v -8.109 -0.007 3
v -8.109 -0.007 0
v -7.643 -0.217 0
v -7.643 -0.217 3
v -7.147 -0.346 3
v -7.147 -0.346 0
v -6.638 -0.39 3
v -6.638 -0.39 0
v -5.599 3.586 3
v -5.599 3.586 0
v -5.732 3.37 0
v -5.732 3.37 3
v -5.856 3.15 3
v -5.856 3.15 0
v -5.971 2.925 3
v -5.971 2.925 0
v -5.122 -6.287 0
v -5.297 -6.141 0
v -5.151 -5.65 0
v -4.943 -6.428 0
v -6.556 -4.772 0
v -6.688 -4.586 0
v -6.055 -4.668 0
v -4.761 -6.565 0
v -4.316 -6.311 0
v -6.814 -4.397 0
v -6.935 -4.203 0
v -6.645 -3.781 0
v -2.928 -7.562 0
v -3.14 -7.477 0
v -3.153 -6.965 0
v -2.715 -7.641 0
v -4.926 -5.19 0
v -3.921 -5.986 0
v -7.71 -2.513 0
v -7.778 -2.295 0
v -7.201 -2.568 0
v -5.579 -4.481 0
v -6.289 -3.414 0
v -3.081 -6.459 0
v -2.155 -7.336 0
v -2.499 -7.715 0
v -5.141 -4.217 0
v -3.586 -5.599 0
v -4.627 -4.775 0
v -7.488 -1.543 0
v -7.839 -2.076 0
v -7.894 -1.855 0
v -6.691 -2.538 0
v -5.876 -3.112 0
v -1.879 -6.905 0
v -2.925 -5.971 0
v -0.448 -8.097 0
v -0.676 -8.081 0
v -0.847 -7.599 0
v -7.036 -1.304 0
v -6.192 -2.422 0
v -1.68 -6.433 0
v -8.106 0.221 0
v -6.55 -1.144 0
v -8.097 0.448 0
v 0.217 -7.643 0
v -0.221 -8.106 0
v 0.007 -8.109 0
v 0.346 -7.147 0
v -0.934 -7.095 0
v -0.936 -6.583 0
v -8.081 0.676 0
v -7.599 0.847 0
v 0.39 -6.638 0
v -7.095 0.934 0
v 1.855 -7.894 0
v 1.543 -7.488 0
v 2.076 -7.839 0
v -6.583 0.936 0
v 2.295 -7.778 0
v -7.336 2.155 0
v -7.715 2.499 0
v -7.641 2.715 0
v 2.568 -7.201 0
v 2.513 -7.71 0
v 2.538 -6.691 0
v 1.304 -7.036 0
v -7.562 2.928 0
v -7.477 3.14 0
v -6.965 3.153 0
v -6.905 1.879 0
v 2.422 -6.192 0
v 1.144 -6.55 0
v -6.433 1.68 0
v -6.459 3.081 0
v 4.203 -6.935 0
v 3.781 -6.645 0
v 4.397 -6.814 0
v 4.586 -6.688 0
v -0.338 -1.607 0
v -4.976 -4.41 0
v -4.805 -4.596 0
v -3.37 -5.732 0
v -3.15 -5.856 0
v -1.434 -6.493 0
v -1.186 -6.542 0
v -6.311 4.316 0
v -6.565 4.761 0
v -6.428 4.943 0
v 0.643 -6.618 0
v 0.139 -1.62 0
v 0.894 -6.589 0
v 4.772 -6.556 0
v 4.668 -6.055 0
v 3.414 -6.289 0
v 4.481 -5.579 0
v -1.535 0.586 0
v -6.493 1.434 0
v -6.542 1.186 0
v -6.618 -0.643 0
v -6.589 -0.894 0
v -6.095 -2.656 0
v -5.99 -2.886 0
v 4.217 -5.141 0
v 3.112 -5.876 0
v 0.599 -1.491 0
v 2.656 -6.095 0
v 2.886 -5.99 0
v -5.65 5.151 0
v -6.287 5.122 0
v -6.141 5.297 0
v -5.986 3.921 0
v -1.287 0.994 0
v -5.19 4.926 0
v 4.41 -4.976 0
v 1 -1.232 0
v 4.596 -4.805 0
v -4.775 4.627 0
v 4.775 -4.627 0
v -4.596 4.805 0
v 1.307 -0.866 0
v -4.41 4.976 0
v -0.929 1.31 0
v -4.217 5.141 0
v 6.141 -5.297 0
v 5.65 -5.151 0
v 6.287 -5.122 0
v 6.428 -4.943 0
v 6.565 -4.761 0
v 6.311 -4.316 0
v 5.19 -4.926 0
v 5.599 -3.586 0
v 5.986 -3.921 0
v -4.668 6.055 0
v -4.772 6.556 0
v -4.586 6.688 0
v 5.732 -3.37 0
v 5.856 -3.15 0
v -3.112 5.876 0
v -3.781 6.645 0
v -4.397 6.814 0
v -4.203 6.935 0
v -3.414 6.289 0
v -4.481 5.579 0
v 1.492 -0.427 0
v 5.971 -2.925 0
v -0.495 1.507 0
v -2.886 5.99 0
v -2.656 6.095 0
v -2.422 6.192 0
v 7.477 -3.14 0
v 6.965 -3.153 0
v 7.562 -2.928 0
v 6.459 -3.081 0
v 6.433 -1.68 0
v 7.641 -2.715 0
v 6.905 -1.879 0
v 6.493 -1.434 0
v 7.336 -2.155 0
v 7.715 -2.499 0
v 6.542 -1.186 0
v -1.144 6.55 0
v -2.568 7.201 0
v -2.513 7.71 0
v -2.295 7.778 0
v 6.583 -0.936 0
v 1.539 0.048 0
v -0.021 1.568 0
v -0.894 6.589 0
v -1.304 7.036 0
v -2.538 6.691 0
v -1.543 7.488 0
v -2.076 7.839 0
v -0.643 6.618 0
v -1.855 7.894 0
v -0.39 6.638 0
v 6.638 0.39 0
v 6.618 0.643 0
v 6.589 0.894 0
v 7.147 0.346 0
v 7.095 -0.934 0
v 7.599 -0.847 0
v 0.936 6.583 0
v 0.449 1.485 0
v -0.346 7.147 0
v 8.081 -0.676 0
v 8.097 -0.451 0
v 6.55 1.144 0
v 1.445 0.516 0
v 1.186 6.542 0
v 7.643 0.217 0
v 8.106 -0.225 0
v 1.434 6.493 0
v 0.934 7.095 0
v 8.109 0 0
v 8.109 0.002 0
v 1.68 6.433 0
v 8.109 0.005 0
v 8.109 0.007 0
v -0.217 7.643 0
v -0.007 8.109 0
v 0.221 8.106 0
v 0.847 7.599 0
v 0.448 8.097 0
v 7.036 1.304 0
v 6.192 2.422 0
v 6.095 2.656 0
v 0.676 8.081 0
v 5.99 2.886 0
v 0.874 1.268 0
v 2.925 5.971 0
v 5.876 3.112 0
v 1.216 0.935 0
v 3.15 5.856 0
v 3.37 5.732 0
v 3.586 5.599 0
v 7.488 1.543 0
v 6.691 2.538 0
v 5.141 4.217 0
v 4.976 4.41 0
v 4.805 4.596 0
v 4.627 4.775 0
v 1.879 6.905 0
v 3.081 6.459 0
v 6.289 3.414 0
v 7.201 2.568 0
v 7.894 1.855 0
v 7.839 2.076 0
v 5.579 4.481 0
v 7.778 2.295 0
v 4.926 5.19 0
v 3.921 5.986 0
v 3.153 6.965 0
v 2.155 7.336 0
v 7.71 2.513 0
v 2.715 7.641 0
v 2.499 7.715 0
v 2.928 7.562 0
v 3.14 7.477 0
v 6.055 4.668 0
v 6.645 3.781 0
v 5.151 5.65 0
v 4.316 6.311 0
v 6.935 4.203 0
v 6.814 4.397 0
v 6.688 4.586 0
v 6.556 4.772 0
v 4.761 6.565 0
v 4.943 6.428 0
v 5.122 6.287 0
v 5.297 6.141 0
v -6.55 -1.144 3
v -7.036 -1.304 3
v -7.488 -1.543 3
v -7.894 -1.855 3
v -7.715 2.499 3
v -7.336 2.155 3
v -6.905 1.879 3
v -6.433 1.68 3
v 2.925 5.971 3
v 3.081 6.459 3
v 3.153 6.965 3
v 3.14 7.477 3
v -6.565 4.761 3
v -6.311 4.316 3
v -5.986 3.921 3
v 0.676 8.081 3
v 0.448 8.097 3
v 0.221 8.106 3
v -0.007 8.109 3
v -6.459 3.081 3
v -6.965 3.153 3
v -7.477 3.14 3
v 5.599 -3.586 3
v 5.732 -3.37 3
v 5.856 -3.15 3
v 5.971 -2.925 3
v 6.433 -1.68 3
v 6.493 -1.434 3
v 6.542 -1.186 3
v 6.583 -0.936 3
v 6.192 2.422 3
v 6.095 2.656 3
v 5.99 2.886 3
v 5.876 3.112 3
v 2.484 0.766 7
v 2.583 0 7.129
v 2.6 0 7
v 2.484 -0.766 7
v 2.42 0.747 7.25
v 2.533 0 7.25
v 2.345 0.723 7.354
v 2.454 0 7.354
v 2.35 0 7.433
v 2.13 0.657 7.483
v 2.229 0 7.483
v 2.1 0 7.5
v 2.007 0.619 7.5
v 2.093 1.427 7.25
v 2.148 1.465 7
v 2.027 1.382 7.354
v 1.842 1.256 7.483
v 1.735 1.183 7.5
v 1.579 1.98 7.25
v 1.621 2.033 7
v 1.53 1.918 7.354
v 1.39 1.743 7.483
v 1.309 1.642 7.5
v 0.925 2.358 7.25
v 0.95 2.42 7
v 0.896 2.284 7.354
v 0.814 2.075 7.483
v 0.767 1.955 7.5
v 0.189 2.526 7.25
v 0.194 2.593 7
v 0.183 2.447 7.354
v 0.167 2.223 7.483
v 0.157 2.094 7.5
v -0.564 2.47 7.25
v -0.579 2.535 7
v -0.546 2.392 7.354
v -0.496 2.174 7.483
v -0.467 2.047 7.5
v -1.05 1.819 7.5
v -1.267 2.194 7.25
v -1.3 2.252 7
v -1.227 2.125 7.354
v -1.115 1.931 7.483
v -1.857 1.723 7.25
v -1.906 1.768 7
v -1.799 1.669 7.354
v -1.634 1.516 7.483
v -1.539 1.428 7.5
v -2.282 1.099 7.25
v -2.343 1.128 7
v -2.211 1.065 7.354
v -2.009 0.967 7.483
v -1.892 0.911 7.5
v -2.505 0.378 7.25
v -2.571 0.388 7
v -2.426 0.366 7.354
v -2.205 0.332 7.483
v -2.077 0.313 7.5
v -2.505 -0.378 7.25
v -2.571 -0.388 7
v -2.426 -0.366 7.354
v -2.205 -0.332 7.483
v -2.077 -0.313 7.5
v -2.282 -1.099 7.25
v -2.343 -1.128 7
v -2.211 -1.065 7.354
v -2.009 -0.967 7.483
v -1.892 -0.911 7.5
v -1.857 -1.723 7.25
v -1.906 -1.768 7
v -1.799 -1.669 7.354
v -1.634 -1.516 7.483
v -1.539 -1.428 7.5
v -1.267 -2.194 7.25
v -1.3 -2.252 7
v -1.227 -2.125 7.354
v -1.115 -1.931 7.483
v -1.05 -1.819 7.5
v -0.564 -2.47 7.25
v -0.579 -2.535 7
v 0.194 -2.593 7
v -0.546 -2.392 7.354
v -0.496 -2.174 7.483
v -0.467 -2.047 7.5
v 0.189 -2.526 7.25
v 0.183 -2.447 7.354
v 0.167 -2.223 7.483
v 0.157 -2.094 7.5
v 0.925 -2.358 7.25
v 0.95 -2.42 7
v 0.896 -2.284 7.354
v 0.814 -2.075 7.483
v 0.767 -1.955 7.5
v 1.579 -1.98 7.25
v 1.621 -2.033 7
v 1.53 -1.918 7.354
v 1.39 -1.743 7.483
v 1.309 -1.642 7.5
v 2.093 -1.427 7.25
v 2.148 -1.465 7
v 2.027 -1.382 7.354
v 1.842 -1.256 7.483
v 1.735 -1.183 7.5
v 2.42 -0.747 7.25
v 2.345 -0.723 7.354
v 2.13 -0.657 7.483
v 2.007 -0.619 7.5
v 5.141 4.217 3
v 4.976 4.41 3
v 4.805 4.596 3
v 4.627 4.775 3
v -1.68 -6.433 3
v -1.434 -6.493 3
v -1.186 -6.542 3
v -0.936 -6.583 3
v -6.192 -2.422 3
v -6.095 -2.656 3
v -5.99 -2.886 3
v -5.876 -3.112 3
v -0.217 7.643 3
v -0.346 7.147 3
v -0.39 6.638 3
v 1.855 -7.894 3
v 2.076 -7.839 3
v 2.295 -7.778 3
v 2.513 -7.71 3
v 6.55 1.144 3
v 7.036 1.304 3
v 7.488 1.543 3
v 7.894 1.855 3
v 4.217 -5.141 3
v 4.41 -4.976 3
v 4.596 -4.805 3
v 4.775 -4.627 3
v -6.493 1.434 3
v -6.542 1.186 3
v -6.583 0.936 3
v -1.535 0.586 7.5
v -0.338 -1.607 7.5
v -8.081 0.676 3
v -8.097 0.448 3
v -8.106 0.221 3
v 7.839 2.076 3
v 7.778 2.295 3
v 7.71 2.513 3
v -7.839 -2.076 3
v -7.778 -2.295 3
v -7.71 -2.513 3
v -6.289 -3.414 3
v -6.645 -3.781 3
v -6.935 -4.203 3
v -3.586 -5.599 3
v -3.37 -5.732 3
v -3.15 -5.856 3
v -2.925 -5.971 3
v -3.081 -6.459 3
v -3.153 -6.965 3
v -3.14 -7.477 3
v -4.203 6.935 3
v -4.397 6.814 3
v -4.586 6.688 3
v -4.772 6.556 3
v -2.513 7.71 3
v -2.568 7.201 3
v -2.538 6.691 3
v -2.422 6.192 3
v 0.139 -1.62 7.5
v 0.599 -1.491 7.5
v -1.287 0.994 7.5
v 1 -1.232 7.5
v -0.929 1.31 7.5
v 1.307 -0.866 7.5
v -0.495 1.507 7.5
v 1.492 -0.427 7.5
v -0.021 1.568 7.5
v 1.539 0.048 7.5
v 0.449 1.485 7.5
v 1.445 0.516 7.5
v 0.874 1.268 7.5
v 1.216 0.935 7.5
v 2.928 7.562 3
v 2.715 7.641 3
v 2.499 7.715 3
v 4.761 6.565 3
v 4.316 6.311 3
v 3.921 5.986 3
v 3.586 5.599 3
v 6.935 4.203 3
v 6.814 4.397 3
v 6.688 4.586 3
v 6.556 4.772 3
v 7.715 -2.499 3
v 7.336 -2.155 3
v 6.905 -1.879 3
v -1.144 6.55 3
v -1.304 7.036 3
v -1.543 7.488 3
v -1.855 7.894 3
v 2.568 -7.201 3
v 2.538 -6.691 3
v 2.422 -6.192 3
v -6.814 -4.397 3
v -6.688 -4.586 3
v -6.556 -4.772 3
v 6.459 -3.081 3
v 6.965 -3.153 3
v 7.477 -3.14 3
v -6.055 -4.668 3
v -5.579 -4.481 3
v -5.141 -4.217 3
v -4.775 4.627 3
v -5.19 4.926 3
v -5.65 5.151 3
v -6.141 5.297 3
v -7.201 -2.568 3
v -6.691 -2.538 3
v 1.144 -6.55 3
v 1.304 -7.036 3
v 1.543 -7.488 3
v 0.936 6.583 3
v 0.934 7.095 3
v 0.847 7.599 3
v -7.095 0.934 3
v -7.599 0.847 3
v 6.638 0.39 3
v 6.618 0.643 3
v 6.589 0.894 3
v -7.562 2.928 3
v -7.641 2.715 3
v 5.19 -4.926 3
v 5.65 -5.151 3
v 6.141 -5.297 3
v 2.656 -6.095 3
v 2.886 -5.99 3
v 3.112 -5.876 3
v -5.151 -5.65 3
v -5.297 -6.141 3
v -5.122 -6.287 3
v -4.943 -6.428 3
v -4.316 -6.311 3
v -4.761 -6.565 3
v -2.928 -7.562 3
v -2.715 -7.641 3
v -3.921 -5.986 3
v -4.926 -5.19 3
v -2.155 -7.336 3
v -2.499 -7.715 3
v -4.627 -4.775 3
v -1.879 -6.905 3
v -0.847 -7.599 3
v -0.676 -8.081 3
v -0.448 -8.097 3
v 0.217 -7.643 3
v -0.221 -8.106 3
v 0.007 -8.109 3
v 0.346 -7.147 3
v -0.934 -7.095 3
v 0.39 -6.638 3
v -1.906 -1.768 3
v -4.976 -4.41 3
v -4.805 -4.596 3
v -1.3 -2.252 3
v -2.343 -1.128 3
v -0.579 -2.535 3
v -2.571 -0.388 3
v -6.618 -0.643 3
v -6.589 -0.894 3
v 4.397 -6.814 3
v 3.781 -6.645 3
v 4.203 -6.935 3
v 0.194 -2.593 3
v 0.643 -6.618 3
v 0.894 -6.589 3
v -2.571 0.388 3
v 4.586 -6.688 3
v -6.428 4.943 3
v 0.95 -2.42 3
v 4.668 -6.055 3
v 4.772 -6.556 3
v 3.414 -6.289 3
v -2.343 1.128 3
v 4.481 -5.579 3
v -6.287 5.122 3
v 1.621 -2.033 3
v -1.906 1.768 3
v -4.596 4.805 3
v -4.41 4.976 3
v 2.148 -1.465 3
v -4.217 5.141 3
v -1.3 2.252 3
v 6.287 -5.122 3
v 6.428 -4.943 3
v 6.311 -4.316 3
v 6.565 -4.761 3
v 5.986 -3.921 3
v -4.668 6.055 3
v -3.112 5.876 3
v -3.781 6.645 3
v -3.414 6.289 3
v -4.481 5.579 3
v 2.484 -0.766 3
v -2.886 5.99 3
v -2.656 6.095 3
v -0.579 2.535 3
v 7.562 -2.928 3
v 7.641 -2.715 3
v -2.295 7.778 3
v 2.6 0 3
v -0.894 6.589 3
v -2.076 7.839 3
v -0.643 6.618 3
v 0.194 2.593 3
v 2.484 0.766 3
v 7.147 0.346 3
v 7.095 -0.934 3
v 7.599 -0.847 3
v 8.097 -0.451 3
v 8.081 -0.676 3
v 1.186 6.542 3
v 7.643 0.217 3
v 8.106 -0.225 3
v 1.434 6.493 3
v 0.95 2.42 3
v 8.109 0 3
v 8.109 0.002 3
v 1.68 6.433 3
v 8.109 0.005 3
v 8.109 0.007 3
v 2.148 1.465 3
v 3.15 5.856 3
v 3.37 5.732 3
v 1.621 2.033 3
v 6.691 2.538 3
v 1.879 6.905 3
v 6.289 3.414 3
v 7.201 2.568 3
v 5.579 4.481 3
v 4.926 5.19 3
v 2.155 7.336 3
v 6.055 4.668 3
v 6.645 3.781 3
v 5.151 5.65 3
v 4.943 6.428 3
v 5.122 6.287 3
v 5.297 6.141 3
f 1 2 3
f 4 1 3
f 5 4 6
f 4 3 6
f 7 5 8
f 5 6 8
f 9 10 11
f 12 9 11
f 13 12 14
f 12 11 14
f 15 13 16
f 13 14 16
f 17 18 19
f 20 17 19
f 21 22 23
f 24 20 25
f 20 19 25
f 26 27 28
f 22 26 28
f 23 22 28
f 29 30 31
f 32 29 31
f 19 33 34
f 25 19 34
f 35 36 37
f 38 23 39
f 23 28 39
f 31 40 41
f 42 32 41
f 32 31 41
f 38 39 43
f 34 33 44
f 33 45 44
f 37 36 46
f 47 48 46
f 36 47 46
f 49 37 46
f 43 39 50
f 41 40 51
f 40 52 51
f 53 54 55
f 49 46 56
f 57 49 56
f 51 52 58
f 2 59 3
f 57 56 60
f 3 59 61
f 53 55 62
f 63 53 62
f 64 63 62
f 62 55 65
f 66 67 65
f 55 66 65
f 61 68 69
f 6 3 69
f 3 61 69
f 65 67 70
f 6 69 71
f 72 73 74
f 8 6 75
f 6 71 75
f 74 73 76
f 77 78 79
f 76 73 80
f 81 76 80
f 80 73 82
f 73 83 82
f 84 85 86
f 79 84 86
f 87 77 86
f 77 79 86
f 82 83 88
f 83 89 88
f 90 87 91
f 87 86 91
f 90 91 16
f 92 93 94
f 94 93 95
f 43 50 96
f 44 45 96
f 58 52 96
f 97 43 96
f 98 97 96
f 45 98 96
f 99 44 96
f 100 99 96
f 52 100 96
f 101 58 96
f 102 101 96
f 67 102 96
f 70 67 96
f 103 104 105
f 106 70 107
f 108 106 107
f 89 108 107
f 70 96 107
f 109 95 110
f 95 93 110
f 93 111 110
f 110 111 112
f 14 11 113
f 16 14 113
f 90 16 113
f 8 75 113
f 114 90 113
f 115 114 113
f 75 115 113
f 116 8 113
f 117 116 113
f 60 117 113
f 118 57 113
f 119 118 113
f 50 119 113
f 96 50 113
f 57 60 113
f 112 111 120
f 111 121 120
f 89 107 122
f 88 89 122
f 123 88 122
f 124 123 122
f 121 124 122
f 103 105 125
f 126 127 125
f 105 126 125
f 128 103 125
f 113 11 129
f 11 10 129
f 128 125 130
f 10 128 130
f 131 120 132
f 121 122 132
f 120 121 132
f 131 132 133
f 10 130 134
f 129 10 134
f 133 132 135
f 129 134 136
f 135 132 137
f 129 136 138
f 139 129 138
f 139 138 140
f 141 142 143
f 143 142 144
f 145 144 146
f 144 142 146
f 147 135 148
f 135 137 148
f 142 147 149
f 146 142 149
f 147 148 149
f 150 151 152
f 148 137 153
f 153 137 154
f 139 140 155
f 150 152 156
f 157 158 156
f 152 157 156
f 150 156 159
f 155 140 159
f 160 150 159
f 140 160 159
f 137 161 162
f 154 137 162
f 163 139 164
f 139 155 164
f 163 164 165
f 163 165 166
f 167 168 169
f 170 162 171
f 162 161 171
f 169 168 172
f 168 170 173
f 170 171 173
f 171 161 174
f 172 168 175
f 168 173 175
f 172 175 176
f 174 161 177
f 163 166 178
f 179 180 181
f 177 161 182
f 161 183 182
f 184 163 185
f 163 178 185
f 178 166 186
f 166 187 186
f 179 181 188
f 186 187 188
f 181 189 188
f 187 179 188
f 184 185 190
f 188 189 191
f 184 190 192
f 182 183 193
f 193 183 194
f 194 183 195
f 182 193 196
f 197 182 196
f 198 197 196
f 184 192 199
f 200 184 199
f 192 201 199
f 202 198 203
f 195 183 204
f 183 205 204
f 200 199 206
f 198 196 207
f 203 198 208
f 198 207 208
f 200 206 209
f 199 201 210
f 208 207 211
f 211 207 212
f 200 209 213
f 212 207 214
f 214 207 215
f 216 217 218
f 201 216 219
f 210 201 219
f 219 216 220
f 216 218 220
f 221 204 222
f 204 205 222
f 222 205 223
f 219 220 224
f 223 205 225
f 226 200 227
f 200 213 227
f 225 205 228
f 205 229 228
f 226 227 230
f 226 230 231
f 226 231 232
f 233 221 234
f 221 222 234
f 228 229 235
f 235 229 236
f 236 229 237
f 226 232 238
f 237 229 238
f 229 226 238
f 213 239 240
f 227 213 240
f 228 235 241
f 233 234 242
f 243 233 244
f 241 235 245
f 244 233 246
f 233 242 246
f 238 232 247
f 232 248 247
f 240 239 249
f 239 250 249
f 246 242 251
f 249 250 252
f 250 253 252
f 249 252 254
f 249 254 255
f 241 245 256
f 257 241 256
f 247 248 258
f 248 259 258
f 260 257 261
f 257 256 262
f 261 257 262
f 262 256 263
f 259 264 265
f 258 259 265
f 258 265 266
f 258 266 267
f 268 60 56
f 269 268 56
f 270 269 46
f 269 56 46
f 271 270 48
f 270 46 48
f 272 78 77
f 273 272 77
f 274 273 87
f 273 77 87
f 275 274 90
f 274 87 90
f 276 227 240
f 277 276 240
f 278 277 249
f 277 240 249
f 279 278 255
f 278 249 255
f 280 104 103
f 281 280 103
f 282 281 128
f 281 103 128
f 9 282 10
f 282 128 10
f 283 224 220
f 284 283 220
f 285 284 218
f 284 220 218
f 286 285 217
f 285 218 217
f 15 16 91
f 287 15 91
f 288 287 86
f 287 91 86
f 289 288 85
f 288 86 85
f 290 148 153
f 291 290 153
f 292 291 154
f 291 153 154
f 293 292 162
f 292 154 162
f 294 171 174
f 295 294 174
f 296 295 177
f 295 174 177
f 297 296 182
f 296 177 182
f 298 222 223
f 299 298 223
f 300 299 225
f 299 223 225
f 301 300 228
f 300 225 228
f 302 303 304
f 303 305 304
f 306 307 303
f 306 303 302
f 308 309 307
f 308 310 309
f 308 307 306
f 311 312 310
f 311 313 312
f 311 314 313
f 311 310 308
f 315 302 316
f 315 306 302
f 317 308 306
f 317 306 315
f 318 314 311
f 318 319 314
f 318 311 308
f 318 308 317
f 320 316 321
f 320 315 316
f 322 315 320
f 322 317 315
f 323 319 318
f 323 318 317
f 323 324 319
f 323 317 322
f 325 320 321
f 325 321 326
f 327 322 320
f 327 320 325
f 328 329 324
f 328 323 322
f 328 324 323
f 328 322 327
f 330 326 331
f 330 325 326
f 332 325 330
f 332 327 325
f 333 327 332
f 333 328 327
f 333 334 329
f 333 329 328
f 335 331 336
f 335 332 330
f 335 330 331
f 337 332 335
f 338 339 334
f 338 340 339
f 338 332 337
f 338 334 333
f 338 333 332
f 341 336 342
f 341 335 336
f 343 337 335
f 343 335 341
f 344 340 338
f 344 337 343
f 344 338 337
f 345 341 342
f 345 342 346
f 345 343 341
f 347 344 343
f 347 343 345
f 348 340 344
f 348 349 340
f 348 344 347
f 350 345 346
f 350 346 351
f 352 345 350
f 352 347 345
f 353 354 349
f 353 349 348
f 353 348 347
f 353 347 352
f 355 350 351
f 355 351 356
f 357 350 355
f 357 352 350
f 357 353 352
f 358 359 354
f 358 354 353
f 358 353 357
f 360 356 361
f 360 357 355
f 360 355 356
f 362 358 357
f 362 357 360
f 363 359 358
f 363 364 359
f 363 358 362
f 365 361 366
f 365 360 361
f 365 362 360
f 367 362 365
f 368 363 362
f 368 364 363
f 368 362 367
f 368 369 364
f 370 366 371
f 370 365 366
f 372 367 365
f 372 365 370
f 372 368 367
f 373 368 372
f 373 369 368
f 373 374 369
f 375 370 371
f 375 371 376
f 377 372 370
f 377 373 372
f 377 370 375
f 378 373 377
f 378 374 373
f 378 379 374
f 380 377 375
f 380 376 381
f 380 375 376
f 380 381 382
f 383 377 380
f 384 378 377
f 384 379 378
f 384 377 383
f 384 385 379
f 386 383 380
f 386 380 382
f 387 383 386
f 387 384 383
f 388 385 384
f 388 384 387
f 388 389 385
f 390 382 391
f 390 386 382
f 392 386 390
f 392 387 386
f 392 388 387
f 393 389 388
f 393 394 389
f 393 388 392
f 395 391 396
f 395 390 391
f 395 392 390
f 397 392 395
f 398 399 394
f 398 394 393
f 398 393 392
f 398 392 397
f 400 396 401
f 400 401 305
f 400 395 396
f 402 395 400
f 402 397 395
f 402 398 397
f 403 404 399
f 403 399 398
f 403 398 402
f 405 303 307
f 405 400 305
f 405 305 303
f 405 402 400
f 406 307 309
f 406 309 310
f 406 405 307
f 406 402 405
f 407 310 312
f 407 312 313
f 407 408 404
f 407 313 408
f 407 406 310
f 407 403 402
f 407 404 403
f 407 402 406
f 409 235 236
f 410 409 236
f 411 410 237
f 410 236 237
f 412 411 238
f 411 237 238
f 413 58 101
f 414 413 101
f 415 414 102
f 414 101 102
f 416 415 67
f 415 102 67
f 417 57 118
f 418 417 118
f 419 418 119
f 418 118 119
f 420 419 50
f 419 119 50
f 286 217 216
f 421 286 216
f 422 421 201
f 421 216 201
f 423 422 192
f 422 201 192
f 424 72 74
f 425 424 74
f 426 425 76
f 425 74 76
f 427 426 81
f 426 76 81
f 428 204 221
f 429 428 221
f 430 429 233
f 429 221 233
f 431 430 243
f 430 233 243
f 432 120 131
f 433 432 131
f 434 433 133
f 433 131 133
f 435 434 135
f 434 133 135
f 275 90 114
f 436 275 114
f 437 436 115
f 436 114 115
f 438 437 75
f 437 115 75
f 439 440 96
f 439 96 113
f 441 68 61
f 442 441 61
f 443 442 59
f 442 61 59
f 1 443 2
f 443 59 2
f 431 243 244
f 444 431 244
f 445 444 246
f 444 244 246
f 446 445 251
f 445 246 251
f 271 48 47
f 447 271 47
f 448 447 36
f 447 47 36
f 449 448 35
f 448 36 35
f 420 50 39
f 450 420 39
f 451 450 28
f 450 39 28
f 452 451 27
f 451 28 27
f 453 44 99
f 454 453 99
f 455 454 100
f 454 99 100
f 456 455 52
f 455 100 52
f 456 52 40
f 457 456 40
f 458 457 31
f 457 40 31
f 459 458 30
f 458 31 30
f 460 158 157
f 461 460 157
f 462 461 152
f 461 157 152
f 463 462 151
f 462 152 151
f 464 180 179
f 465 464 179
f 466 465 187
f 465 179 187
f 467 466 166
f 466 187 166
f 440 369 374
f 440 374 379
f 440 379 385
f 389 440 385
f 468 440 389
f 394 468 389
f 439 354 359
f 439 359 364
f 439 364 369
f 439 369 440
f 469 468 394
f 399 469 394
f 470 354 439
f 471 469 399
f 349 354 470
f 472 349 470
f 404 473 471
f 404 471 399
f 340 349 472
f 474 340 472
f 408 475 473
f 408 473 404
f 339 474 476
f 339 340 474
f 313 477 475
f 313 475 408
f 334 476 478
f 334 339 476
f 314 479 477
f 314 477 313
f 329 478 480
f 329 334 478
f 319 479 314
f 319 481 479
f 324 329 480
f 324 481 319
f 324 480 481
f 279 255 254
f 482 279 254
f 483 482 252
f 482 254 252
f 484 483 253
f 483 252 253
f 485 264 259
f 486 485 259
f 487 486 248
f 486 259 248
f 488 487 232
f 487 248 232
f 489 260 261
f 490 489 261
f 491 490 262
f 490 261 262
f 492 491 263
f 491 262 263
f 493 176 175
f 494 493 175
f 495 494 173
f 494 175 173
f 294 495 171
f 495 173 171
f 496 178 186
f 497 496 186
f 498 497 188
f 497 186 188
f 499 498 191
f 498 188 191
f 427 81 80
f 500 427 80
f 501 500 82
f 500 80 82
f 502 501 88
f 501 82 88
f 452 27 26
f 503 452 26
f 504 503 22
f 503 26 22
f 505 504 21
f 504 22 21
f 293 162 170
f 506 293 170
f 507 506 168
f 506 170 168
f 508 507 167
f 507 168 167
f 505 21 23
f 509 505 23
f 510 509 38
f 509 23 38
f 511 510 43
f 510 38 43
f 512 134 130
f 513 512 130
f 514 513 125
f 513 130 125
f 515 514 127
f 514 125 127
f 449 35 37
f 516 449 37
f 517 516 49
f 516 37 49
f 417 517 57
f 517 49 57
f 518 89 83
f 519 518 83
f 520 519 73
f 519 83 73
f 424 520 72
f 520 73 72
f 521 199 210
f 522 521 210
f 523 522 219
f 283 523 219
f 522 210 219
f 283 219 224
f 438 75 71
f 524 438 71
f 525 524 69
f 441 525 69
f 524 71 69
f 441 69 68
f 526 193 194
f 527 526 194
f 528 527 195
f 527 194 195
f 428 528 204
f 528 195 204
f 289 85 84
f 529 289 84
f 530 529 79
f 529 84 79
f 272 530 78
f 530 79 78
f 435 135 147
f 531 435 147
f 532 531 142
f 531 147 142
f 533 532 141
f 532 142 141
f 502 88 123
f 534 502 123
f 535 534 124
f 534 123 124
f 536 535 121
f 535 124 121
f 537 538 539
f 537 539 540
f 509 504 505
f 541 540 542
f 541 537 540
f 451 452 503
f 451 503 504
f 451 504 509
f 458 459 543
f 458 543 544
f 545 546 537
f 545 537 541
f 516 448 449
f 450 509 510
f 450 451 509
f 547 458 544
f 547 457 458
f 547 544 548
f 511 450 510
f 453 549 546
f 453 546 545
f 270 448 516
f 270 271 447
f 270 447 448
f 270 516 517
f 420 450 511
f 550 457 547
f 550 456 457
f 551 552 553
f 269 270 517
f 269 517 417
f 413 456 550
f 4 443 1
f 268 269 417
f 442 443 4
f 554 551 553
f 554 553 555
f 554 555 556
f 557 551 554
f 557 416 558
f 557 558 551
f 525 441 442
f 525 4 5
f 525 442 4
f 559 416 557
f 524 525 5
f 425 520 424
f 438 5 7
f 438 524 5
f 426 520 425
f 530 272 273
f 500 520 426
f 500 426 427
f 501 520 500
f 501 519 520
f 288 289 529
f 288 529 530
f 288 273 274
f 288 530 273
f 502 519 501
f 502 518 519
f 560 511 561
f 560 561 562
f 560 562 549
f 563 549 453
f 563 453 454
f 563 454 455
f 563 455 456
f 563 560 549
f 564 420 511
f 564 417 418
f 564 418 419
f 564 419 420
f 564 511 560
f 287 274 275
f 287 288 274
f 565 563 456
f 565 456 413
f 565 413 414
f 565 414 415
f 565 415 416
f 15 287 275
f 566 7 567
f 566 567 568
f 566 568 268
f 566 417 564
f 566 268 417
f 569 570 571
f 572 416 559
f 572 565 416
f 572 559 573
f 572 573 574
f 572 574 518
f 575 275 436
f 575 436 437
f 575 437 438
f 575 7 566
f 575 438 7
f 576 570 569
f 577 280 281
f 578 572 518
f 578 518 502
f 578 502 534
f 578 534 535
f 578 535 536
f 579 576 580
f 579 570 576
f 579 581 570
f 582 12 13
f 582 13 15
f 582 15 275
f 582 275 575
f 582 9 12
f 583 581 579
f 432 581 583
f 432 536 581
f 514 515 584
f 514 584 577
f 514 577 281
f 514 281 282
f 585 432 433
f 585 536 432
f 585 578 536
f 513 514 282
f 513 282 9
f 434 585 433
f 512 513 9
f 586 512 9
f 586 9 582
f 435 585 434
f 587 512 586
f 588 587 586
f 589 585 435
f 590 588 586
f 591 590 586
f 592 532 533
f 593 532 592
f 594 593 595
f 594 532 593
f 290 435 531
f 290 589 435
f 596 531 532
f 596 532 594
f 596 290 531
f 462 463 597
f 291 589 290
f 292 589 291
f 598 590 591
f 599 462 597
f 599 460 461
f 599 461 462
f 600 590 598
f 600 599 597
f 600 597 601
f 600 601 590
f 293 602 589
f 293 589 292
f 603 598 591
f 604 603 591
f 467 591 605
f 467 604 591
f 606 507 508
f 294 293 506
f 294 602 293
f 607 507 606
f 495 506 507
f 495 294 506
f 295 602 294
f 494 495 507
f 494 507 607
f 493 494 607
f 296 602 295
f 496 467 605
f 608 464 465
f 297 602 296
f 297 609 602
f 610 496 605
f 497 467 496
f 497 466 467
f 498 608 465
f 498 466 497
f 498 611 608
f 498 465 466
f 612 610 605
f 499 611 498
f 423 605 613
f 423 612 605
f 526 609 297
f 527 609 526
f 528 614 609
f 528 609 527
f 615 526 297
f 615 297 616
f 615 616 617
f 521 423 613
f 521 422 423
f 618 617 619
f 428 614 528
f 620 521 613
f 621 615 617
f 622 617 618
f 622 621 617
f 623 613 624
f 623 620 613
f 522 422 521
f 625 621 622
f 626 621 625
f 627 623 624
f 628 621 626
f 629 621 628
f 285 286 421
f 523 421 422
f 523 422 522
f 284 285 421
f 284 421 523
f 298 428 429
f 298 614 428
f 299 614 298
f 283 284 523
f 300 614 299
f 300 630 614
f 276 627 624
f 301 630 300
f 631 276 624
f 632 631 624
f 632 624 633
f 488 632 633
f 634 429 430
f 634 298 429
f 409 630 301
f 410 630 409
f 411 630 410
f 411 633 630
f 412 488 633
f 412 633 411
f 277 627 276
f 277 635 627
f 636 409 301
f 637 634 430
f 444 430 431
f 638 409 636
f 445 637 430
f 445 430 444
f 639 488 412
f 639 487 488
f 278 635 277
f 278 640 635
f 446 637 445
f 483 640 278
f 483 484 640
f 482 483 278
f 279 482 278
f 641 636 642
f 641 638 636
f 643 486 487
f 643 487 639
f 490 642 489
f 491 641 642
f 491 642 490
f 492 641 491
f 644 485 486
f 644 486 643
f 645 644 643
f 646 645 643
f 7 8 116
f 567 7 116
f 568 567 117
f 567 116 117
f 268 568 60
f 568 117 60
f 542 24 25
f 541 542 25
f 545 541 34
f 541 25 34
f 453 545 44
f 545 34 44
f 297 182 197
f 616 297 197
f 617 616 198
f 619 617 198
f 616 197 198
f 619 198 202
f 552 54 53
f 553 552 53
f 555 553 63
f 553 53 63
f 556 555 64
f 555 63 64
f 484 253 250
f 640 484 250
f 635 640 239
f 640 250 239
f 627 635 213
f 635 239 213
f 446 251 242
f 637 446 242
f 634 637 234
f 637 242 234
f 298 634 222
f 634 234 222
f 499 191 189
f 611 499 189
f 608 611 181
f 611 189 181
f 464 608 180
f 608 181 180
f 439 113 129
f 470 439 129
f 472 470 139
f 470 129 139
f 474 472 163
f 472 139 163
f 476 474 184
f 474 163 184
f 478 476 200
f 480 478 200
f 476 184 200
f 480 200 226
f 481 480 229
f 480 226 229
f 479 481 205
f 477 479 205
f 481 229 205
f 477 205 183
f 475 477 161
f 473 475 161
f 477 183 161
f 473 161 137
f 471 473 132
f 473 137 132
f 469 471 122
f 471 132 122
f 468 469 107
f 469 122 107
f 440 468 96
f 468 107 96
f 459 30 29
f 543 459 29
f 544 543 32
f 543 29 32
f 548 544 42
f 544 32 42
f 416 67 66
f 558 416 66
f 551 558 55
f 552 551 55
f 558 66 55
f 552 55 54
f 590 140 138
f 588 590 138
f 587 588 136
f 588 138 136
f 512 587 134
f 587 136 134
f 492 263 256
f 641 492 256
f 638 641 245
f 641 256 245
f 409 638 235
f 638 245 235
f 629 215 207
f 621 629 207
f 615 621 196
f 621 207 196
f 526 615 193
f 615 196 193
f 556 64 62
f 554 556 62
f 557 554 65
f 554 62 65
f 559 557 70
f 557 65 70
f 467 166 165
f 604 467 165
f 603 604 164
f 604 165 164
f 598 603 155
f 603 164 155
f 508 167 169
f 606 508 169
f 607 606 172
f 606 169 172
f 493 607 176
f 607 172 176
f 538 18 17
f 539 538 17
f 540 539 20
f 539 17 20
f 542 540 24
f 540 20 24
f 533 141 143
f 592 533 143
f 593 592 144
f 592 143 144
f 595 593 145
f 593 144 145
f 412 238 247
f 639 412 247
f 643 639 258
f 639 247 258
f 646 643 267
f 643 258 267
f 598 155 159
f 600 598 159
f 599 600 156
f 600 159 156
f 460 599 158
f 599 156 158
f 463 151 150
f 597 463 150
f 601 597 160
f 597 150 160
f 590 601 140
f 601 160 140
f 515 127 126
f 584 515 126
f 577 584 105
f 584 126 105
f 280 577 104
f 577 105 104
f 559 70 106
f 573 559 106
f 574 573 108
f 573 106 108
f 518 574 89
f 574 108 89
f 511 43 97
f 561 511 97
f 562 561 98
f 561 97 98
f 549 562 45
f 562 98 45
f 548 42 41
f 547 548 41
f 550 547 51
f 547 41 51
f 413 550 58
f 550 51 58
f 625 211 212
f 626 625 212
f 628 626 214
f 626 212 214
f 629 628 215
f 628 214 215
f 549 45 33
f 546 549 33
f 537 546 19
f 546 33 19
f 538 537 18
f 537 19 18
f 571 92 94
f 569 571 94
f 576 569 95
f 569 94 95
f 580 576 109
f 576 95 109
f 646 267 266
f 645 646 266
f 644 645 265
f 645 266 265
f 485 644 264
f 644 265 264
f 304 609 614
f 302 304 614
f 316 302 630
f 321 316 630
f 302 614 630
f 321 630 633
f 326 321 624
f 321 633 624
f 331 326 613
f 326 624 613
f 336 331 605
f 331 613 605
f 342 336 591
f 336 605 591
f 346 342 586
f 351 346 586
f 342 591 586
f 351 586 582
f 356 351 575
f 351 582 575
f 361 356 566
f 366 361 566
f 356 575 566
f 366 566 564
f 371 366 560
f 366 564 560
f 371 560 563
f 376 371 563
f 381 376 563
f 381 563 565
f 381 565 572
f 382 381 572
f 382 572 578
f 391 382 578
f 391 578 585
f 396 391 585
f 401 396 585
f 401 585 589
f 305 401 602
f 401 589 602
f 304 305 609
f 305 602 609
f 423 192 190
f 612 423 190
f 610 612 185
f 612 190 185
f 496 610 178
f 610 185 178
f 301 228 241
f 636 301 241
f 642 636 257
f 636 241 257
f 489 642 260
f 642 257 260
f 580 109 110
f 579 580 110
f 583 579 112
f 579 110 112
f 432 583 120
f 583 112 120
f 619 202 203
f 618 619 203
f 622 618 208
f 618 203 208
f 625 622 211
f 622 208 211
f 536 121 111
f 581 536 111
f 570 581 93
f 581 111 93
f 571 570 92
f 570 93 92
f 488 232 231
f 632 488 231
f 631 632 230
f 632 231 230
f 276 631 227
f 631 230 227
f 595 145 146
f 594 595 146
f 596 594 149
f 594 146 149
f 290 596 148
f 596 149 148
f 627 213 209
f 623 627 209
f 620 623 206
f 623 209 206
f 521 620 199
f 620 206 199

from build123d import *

# Parameters (mm, degrees)
EXTRUDE_4_DEPTH     = 3
SKETCH_5_R          = 2.6
EXTRUDE_6_DEPTH     = 4.5
FILLET_1_R          = 0.5
CUT_EXTRUDE_1_DEPTH = 14.702930219


with BuildPart() as part:
    # 草图4 → 凸台-拉伸4 (new body)
    with BuildSketch(Plane.XY):
        with BuildLine():
            ThreePointArc((8.109259925, 0.007195304), (7.397764467, 0.292254868), (6.637585045, 0.390295618))
            ThreePointArc((6.637585045, 0.390295618), (6.604507127, 0.768343357), (6.549914936, 1.143888207))
            ThreePointArc((6.549914936, 1.143888207), (7.267285645, 1.413821546), (7.894339522, 1.854602872))
            ThreePointArc((7.894339522, 1.854602872), (7.809176661, 2.185613911), (7.710141023, 2.512742269))
            ThreePointArc((7.710141023, 2.512742269), (6.945380381, 2.563985838), (6.192110531, 2.422319772))
            ThreePointArc((6.192110531, 2.422319772), (6.043828385, 2.771642898), (5.875858386, 3.11193736))
            ThreePointArc((5.875858386, 3.11193736), (6.474704484, 3.590338961), (6.934859239, 4.203317219))
            ThreePointArc((6.934859239, 4.203317219), (6.751576509, 4.491810653), (6.556299797, 4.772324514))
            ThreePointArc((6.556299797, 4.772324514), (5.813134073, 4.584736009), (5.140509095, 4.217230388))
            ThreePointArc((5.140509095, 4.217230388), (4.891537611, 4.503634721), (4.626631877, 4.775368402))
            ThreePointArc((4.626631877, 4.775368402), (5.048334136, 5.415408984), (5.296546615, 6.140581589))
            ThreePointArc((5.296546615, 6.140581589), (5.033085007, 6.358317671), (4.760682268, 6.564758384))
            ThreePointArc((4.760682268, 6.564758384), (4.111857698, 6.156700276), (3.585718812, 5.599329112))
            ThreePointArc((3.585718812, 5.599329112), (3.260429054, 5.794779399), (2.924518404, 5.971353113))
            ThreePointArc((2.924518404, 5.971353113), (3.127797669, 6.710381044), (3.139771106, 7.47676305))
            ThreePointArc((3.139771106, 7.47676305), (2.821920077, 7.602428255), (2.499055988, 7.714587965))
            ThreePointArc((2.499055988, 7.714587965), (2.008084044, 7.126003823), (1.67993339, 6.433326489))
            ThreePointArc((1.67993339, 6.433326489), (1.310166985, 6.518690695), (0.936132694, 6.582820177))
            ThreePointArc((0.936132694, 6.582820177), (0.901090574, 7.348494254), (0.675652925, 8.081066849))
            ThreePointArc((0.675652925, 8.081066849), (0.334525948, 8.102360192), (-0.007195304, 8.109259925))
            ThreePointArc((-0.007195304, 8.109259925), (-0.292254868, 7.397764467), (-0.390295618, 6.637585045))
            ThreePointArc((-0.390295618, 6.637585045), (-0.768343357, 6.604507127), (-1.143888207, 6.549914936))
            ThreePointArc((-1.143888207, 6.549914936), (-1.413821546, 7.267285645), (-1.854602872, 7.894339522))
            ThreePointArc((-1.854602872, 7.894339522), (-2.185613911, 7.809176661), (-2.512742269, 7.710141023))
            ThreePointArc((-2.512742269, 7.710141023), (-2.563985838, 6.945380381), (-2.422319772, 6.192110531))
            ThreePointArc((-2.422319772, 6.192110531), (-2.771642898, 6.043828385), (-3.11193736, 5.875858386))
            ThreePointArc((-3.11193736, 5.875858386), (-3.590338961, 6.474704484), (-4.203317219, 6.934859239))
            ThreePointArc((-4.203317219, 6.934859239), (-4.491810653, 6.751576509), (-4.772324514, 6.556299797))
            ThreePointArc((-4.772324514, 6.556299797), (-4.584736009, 5.813134073), (-4.217230388, 5.140509095))
            ThreePointArc((-4.217230388, 5.140509095), (-4.503634721, 4.891537611), (-4.775368402, 4.626631877))
            ThreePointArc((-4.775368402, 4.626631877), (-5.415408984, 5.048334136), (-6.140581589, 5.296546615))
            ThreePointArc((-6.140581589, 5.296546615), (-6.358317671, 5.033085007), (-6.564758384, 4.760682268))
            ThreePointArc((-6.564758384, 4.760682268), (-6.156700276, 4.111857698), (-5.599329112, 3.585718812))
            ThreePointArc((-5.599329112, 3.585718812), (-5.794779399, 3.260429054), (-5.971353113, 2.924518404))
            ThreePointArc((-5.971353113, 2.924518404), (-6.710381044, 3.127797669), (-7.47676305, 3.139771106))
            ThreePointArc((-7.47676305, 3.139771106), (-7.602428255, 2.821920077), (-7.714587965, 2.499055988))
            ThreePointArc((-7.714587965, 2.499055988), (-7.126003823, 2.008084044), (-6.433326489, 1.67993339))
            ThreePointArc((-6.433326489, 1.67993339), (-6.518690695, 1.310166985), (-6.582820177, 0.936132694))
            ThreePointArc((-6.582820177, 0.936132694), (-7.348494254, 0.901090574), (-8.081066849, 0.675652925))
            ThreePointArc((-8.081066849, 0.675652925), (-8.102360192, 0.334525948), (-8.109259925, -0.007195304))
            ThreePointArc((-8.109259925, -0.007195304), (-7.397764467, -0.292254868), (-6.637585045, -0.390295618))
            ThreePointArc((-6.637585045, -0.390295618), (-6.604507127, -0.768343357), (-6.549914936, -1.143888207))
            ThreePointArc((-6.549914936, -1.143888207), (-7.267285646, -1.413821546), (-7.894339522, -1.854602872))
            ThreePointArc((-7.894339522, -1.854602872), (-7.809176662, -2.185613911), (-7.710141023, -2.512742269))
            ThreePointArc((-7.710141023, -2.512742269), (-6.945380381, -2.563985838), (-6.192110531, -2.422319772))
            ThreePointArc((-6.192110531, -2.422319772), (-6.043828385, -2.771642898), (-5.875858386, -3.11193736))
            ThreePointArc((-5.875858386, -3.11193736), (-6.474704484, -3.590338961), (-6.934859239, -4.203317219))
            ThreePointArc((-6.934859239, -4.203317219), (-6.751576509, -4.491810653), (-6.556299797, -4.772324514))
            ThreePointArc((-6.556299797, -4.772324514), (-5.813134073, -4.584736009), (-5.140509095, -4.217230388))
            ThreePointArc((-5.140509095, -4.217230388), (-4.891537611, -4.503634721), (-4.626631877, -4.775368402))
            ThreePointArc((-4.626631877, -4.775368402), (-5.048334136, -5.415408984), (-5.296546615, -6.140581589))
            ThreePointArc((-5.296546615, -6.140581589), (-5.033085007, -6.358317671), (-4.760682268, -6.564758384))
            ThreePointArc((-4.760682268, -6.564758384), (-4.111857698, -6.156700276), (-3.585718813, -5.599329112))
            ThreePointArc((-3.585718813, -5.599329112), (-3.260429054, -5.794779399), (-2.924518404, -5.971353114))
            ThreePointArc((-2.924518404, -5.971353114), (-3.127797669, -6.710381044), (-3.139771106, -7.47676305))
            ThreePointArc((-3.139771106, -7.47676305), (-2.821920077, -7.602428255), (-2.499055988, -7.714587965))
            ThreePointArc((-2.499055988, -7.714587965), (-2.008084044, -7.126003823), (-1.67993339, -6.433326489))
            ThreePointArc((-1.67993339, -6.433326489), (-1.310166985, -6.518690695), (-0.936132694, -6.582820177))
            ThreePointArc((-0.936132694, -6.582820177), (-0.901090574, -7.348494254), (-0.675652925, -8.081066849))
            ThreePointArc((-0.675652925, -8.081066849), (-0.334525948, -8.102360192), (0.007195304, -8.109259925))
            ThreePointArc((0.007195304, -8.109259925), (0.292254868, -7.397764467), (0.390295618, -6.637585045))
            ThreePointArc((0.390295618, -6.637585045), (0.768343357, -6.604507127), (1.143888207, -6.549914936))
            ThreePointArc((1.143888207, -6.549914936), (1.413821546, -7.267285645), (1.854602872, -7.894339522))
            ThreePointArc((1.854602872, -7.894339522), (2.185613911, -7.809176661), (2.512742269, -7.710141023))
            ThreePointArc((2.512742269, -7.710141023), (2.563985838, -6.945380381), (2.422319772, -6.192110531))
            ThreePointArc((2.422319772, -6.192110531), (2.771642898, -6.043828385), (3.11193736, -5.875858386))
            ThreePointArc((3.11193736, -5.875858386), (3.590338961, -6.474704484), (4.203317219, -6.934859239))
            ThreePointArc((4.203317219, -6.934859239), (4.491810653, -6.751576509), (4.772324514, -6.556299797))
            ThreePointArc((4.772324514, -6.556299797), (4.584736009, -5.813134073), (4.217230388, -5.140509095))
            ThreePointArc((4.217230388, -5.140509095), (4.503634721, -4.891537611), (4.775368402, -4.626631877))
            ThreePointArc((4.775368402, -4.626631877), (5.415408984, -5.048334136), (6.140581589, -5.296546615))
            ThreePointArc((6.140581589, -5.296546615), (6.358317671, -5.033085007), (6.564758384, -4.760682268))
            ThreePointArc((6.564758384, -4.760682268), (6.156700276, -4.111857698), (5.599329112, -3.585718812))
            ThreePointArc((5.599329112, -3.585718812), (5.794779399, -3.260429054), (5.971353113, -2.924518404))
            ThreePointArc((5.971353113, -2.924518404), (6.710381044, -3.127797669), (7.47676305, -3.139771106))
            ThreePointArc((7.47676305, -3.139771106), (7.602428255, -2.821920077), (7.714587965, -2.499055988))
            ThreePointArc((7.714587965, -2.499055988), (7.126003823, -2.008084044), (6.433326489, -1.67993339))
            ThreePointArc((6.433326489, -1.67993339), (6.518690695, -1.310166985), (6.582820177, -0.936132694))
            ThreePointArc((6.582820177, -0.936132694), (7.348494254, -0.901090574), (8.081066849, -0.675652925))
            ThreePointArc((8.081066849, -0.675652925), (8.102210984, -0.338120505), (8.109263117, 0))
            ThreePointArc((8.109263117, 0), (8.109262319, 0.003597652), (8.109259925, 0.007195304))
        make_face()
    extrude(amount=EXTRUDE_4_DEPTH)

    # 草图5 → 凸台-拉伸6 (add)
    with BuildSketch(Plane.XY.offset(3)):
        Circle(SKETCH_5_R)
    extrude(amount=EXTRUDE_6_DEPTH)

    # 圆角1
    fillet_1_edges = [part.edges().sort_by_distance(p)[0] for p in [
        (-2.6, 0, 7.5),
    ]]
    fillet(fillet_1_edges, radius=FILLET_1_R)

    # 草图8 → 切除-拉伸1 (cut, through all)
    with BuildSketch(Plane(origin=(0, 0, 0), x_dir=(-1, 0, 0), z_dir=(0, 0, -1))):
        with BuildLine():
            Line((0.33826518, -1.607281695), (1.534533807, 0.585648166))
            ThreePointArc((1.534533807, 0.585648166), (-1.346074271, 0.734299099), (0.33826518, -1.607281695))
        make_face()
    extrude(amount=-CUT_EXTRUDE_1_DEPTH, mode=Mode.SUBTRACT)


solid = part.part
